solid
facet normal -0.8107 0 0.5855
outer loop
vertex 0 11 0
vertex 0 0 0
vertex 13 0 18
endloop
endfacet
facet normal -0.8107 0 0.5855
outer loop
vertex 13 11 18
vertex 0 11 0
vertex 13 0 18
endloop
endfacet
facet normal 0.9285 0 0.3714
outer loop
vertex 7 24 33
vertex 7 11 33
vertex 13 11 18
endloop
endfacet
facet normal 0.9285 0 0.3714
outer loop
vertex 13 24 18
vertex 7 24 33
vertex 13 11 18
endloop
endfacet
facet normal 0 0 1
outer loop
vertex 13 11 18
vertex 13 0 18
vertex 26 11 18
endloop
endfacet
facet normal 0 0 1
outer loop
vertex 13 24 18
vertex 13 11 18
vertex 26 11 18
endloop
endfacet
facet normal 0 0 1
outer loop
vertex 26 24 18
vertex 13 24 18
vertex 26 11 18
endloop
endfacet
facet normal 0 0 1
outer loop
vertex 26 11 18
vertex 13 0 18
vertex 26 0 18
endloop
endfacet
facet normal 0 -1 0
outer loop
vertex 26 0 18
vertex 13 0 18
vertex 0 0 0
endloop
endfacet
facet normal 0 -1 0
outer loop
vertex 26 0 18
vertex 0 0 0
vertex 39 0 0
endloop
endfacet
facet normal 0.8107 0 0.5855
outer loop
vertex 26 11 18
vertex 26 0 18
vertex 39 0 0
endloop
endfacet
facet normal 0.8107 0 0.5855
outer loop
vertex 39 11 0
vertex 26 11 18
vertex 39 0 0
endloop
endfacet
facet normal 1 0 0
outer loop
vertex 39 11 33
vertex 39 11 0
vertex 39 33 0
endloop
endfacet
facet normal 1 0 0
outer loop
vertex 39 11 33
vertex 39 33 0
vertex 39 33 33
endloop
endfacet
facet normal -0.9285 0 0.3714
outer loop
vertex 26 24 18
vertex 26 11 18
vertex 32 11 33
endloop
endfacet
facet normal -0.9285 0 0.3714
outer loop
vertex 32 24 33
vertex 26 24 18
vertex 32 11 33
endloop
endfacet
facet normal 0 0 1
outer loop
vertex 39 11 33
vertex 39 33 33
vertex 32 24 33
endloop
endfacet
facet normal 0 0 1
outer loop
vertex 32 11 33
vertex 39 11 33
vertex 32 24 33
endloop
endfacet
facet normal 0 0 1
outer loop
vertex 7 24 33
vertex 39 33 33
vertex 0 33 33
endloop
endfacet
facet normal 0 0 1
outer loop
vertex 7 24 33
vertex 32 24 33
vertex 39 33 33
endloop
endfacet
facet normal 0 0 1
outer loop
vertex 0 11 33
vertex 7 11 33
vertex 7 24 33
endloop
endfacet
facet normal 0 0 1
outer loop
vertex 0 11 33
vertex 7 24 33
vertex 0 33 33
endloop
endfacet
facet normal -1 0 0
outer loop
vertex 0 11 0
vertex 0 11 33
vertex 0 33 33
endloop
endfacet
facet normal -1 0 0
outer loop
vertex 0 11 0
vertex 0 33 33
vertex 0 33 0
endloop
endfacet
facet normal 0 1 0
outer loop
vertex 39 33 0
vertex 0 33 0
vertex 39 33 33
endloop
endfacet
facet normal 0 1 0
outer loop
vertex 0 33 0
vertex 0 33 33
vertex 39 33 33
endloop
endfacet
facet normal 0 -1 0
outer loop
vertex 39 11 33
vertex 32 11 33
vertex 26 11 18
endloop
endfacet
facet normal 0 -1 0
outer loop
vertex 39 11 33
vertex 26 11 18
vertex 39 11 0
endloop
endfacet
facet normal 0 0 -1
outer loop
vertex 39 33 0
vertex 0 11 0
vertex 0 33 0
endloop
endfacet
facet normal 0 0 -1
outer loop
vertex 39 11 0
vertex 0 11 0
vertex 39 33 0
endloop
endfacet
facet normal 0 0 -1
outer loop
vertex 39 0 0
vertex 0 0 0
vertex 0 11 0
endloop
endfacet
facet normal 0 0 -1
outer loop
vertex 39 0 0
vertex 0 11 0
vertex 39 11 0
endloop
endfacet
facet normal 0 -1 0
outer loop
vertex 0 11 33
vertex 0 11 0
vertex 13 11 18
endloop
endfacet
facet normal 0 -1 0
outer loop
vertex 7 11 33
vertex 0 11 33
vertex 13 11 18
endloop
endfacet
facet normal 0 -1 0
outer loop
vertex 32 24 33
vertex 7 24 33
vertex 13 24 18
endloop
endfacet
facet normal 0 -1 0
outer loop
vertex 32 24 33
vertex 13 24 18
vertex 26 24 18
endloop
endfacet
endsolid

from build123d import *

# Parameters (mm, degrees)
F1_DEPTH = 33
F2_DEPTH = 11
F3_DEPTH = 24


with BuildPart() as f1:
    # F0 (on Front) → F1 (new body)
    with BuildSketch(Plane.XZ):
        Polygon((13, 18), (0, 0), (39, 0), (26, 18), align=None)
        Polygon((0, 33), (0, 0), (13, 18), (7, 33), align=None)
        Polygon((26, 18), (39, 0), (39, 33), (32, 33), align=None)
        Polygon((7, 33), (13, 18), (26, 18), (32, 33), align=None)
    extrude(amount=-F1_DEPTH)

    # F0 (on Front) → F2 (cut)
    with BuildSketch(Plane.XZ):
        Polygon((0, 33), (0, 0), (13, 18), (7, 33), align=None)
        Polygon((7, 33), (13, 18), (26, 18), (32, 33), align=None)
        Polygon((26, 18), (39, 0), (39, 33), (32, 33), align=None)
    extrude(amount=-F2_DEPTH, mode=Mode.SUBTRACT)

    # F0 (on Front) → F3 (cut)
    with BuildSketch(Plane.XZ):
        Polygon((7, 33), (13, 18), (26, 18), (32, 33), align=None)
    extrude(amount=-F3_DEPTH, mode=Mode.SUBTRACT)


solid = f1.part
